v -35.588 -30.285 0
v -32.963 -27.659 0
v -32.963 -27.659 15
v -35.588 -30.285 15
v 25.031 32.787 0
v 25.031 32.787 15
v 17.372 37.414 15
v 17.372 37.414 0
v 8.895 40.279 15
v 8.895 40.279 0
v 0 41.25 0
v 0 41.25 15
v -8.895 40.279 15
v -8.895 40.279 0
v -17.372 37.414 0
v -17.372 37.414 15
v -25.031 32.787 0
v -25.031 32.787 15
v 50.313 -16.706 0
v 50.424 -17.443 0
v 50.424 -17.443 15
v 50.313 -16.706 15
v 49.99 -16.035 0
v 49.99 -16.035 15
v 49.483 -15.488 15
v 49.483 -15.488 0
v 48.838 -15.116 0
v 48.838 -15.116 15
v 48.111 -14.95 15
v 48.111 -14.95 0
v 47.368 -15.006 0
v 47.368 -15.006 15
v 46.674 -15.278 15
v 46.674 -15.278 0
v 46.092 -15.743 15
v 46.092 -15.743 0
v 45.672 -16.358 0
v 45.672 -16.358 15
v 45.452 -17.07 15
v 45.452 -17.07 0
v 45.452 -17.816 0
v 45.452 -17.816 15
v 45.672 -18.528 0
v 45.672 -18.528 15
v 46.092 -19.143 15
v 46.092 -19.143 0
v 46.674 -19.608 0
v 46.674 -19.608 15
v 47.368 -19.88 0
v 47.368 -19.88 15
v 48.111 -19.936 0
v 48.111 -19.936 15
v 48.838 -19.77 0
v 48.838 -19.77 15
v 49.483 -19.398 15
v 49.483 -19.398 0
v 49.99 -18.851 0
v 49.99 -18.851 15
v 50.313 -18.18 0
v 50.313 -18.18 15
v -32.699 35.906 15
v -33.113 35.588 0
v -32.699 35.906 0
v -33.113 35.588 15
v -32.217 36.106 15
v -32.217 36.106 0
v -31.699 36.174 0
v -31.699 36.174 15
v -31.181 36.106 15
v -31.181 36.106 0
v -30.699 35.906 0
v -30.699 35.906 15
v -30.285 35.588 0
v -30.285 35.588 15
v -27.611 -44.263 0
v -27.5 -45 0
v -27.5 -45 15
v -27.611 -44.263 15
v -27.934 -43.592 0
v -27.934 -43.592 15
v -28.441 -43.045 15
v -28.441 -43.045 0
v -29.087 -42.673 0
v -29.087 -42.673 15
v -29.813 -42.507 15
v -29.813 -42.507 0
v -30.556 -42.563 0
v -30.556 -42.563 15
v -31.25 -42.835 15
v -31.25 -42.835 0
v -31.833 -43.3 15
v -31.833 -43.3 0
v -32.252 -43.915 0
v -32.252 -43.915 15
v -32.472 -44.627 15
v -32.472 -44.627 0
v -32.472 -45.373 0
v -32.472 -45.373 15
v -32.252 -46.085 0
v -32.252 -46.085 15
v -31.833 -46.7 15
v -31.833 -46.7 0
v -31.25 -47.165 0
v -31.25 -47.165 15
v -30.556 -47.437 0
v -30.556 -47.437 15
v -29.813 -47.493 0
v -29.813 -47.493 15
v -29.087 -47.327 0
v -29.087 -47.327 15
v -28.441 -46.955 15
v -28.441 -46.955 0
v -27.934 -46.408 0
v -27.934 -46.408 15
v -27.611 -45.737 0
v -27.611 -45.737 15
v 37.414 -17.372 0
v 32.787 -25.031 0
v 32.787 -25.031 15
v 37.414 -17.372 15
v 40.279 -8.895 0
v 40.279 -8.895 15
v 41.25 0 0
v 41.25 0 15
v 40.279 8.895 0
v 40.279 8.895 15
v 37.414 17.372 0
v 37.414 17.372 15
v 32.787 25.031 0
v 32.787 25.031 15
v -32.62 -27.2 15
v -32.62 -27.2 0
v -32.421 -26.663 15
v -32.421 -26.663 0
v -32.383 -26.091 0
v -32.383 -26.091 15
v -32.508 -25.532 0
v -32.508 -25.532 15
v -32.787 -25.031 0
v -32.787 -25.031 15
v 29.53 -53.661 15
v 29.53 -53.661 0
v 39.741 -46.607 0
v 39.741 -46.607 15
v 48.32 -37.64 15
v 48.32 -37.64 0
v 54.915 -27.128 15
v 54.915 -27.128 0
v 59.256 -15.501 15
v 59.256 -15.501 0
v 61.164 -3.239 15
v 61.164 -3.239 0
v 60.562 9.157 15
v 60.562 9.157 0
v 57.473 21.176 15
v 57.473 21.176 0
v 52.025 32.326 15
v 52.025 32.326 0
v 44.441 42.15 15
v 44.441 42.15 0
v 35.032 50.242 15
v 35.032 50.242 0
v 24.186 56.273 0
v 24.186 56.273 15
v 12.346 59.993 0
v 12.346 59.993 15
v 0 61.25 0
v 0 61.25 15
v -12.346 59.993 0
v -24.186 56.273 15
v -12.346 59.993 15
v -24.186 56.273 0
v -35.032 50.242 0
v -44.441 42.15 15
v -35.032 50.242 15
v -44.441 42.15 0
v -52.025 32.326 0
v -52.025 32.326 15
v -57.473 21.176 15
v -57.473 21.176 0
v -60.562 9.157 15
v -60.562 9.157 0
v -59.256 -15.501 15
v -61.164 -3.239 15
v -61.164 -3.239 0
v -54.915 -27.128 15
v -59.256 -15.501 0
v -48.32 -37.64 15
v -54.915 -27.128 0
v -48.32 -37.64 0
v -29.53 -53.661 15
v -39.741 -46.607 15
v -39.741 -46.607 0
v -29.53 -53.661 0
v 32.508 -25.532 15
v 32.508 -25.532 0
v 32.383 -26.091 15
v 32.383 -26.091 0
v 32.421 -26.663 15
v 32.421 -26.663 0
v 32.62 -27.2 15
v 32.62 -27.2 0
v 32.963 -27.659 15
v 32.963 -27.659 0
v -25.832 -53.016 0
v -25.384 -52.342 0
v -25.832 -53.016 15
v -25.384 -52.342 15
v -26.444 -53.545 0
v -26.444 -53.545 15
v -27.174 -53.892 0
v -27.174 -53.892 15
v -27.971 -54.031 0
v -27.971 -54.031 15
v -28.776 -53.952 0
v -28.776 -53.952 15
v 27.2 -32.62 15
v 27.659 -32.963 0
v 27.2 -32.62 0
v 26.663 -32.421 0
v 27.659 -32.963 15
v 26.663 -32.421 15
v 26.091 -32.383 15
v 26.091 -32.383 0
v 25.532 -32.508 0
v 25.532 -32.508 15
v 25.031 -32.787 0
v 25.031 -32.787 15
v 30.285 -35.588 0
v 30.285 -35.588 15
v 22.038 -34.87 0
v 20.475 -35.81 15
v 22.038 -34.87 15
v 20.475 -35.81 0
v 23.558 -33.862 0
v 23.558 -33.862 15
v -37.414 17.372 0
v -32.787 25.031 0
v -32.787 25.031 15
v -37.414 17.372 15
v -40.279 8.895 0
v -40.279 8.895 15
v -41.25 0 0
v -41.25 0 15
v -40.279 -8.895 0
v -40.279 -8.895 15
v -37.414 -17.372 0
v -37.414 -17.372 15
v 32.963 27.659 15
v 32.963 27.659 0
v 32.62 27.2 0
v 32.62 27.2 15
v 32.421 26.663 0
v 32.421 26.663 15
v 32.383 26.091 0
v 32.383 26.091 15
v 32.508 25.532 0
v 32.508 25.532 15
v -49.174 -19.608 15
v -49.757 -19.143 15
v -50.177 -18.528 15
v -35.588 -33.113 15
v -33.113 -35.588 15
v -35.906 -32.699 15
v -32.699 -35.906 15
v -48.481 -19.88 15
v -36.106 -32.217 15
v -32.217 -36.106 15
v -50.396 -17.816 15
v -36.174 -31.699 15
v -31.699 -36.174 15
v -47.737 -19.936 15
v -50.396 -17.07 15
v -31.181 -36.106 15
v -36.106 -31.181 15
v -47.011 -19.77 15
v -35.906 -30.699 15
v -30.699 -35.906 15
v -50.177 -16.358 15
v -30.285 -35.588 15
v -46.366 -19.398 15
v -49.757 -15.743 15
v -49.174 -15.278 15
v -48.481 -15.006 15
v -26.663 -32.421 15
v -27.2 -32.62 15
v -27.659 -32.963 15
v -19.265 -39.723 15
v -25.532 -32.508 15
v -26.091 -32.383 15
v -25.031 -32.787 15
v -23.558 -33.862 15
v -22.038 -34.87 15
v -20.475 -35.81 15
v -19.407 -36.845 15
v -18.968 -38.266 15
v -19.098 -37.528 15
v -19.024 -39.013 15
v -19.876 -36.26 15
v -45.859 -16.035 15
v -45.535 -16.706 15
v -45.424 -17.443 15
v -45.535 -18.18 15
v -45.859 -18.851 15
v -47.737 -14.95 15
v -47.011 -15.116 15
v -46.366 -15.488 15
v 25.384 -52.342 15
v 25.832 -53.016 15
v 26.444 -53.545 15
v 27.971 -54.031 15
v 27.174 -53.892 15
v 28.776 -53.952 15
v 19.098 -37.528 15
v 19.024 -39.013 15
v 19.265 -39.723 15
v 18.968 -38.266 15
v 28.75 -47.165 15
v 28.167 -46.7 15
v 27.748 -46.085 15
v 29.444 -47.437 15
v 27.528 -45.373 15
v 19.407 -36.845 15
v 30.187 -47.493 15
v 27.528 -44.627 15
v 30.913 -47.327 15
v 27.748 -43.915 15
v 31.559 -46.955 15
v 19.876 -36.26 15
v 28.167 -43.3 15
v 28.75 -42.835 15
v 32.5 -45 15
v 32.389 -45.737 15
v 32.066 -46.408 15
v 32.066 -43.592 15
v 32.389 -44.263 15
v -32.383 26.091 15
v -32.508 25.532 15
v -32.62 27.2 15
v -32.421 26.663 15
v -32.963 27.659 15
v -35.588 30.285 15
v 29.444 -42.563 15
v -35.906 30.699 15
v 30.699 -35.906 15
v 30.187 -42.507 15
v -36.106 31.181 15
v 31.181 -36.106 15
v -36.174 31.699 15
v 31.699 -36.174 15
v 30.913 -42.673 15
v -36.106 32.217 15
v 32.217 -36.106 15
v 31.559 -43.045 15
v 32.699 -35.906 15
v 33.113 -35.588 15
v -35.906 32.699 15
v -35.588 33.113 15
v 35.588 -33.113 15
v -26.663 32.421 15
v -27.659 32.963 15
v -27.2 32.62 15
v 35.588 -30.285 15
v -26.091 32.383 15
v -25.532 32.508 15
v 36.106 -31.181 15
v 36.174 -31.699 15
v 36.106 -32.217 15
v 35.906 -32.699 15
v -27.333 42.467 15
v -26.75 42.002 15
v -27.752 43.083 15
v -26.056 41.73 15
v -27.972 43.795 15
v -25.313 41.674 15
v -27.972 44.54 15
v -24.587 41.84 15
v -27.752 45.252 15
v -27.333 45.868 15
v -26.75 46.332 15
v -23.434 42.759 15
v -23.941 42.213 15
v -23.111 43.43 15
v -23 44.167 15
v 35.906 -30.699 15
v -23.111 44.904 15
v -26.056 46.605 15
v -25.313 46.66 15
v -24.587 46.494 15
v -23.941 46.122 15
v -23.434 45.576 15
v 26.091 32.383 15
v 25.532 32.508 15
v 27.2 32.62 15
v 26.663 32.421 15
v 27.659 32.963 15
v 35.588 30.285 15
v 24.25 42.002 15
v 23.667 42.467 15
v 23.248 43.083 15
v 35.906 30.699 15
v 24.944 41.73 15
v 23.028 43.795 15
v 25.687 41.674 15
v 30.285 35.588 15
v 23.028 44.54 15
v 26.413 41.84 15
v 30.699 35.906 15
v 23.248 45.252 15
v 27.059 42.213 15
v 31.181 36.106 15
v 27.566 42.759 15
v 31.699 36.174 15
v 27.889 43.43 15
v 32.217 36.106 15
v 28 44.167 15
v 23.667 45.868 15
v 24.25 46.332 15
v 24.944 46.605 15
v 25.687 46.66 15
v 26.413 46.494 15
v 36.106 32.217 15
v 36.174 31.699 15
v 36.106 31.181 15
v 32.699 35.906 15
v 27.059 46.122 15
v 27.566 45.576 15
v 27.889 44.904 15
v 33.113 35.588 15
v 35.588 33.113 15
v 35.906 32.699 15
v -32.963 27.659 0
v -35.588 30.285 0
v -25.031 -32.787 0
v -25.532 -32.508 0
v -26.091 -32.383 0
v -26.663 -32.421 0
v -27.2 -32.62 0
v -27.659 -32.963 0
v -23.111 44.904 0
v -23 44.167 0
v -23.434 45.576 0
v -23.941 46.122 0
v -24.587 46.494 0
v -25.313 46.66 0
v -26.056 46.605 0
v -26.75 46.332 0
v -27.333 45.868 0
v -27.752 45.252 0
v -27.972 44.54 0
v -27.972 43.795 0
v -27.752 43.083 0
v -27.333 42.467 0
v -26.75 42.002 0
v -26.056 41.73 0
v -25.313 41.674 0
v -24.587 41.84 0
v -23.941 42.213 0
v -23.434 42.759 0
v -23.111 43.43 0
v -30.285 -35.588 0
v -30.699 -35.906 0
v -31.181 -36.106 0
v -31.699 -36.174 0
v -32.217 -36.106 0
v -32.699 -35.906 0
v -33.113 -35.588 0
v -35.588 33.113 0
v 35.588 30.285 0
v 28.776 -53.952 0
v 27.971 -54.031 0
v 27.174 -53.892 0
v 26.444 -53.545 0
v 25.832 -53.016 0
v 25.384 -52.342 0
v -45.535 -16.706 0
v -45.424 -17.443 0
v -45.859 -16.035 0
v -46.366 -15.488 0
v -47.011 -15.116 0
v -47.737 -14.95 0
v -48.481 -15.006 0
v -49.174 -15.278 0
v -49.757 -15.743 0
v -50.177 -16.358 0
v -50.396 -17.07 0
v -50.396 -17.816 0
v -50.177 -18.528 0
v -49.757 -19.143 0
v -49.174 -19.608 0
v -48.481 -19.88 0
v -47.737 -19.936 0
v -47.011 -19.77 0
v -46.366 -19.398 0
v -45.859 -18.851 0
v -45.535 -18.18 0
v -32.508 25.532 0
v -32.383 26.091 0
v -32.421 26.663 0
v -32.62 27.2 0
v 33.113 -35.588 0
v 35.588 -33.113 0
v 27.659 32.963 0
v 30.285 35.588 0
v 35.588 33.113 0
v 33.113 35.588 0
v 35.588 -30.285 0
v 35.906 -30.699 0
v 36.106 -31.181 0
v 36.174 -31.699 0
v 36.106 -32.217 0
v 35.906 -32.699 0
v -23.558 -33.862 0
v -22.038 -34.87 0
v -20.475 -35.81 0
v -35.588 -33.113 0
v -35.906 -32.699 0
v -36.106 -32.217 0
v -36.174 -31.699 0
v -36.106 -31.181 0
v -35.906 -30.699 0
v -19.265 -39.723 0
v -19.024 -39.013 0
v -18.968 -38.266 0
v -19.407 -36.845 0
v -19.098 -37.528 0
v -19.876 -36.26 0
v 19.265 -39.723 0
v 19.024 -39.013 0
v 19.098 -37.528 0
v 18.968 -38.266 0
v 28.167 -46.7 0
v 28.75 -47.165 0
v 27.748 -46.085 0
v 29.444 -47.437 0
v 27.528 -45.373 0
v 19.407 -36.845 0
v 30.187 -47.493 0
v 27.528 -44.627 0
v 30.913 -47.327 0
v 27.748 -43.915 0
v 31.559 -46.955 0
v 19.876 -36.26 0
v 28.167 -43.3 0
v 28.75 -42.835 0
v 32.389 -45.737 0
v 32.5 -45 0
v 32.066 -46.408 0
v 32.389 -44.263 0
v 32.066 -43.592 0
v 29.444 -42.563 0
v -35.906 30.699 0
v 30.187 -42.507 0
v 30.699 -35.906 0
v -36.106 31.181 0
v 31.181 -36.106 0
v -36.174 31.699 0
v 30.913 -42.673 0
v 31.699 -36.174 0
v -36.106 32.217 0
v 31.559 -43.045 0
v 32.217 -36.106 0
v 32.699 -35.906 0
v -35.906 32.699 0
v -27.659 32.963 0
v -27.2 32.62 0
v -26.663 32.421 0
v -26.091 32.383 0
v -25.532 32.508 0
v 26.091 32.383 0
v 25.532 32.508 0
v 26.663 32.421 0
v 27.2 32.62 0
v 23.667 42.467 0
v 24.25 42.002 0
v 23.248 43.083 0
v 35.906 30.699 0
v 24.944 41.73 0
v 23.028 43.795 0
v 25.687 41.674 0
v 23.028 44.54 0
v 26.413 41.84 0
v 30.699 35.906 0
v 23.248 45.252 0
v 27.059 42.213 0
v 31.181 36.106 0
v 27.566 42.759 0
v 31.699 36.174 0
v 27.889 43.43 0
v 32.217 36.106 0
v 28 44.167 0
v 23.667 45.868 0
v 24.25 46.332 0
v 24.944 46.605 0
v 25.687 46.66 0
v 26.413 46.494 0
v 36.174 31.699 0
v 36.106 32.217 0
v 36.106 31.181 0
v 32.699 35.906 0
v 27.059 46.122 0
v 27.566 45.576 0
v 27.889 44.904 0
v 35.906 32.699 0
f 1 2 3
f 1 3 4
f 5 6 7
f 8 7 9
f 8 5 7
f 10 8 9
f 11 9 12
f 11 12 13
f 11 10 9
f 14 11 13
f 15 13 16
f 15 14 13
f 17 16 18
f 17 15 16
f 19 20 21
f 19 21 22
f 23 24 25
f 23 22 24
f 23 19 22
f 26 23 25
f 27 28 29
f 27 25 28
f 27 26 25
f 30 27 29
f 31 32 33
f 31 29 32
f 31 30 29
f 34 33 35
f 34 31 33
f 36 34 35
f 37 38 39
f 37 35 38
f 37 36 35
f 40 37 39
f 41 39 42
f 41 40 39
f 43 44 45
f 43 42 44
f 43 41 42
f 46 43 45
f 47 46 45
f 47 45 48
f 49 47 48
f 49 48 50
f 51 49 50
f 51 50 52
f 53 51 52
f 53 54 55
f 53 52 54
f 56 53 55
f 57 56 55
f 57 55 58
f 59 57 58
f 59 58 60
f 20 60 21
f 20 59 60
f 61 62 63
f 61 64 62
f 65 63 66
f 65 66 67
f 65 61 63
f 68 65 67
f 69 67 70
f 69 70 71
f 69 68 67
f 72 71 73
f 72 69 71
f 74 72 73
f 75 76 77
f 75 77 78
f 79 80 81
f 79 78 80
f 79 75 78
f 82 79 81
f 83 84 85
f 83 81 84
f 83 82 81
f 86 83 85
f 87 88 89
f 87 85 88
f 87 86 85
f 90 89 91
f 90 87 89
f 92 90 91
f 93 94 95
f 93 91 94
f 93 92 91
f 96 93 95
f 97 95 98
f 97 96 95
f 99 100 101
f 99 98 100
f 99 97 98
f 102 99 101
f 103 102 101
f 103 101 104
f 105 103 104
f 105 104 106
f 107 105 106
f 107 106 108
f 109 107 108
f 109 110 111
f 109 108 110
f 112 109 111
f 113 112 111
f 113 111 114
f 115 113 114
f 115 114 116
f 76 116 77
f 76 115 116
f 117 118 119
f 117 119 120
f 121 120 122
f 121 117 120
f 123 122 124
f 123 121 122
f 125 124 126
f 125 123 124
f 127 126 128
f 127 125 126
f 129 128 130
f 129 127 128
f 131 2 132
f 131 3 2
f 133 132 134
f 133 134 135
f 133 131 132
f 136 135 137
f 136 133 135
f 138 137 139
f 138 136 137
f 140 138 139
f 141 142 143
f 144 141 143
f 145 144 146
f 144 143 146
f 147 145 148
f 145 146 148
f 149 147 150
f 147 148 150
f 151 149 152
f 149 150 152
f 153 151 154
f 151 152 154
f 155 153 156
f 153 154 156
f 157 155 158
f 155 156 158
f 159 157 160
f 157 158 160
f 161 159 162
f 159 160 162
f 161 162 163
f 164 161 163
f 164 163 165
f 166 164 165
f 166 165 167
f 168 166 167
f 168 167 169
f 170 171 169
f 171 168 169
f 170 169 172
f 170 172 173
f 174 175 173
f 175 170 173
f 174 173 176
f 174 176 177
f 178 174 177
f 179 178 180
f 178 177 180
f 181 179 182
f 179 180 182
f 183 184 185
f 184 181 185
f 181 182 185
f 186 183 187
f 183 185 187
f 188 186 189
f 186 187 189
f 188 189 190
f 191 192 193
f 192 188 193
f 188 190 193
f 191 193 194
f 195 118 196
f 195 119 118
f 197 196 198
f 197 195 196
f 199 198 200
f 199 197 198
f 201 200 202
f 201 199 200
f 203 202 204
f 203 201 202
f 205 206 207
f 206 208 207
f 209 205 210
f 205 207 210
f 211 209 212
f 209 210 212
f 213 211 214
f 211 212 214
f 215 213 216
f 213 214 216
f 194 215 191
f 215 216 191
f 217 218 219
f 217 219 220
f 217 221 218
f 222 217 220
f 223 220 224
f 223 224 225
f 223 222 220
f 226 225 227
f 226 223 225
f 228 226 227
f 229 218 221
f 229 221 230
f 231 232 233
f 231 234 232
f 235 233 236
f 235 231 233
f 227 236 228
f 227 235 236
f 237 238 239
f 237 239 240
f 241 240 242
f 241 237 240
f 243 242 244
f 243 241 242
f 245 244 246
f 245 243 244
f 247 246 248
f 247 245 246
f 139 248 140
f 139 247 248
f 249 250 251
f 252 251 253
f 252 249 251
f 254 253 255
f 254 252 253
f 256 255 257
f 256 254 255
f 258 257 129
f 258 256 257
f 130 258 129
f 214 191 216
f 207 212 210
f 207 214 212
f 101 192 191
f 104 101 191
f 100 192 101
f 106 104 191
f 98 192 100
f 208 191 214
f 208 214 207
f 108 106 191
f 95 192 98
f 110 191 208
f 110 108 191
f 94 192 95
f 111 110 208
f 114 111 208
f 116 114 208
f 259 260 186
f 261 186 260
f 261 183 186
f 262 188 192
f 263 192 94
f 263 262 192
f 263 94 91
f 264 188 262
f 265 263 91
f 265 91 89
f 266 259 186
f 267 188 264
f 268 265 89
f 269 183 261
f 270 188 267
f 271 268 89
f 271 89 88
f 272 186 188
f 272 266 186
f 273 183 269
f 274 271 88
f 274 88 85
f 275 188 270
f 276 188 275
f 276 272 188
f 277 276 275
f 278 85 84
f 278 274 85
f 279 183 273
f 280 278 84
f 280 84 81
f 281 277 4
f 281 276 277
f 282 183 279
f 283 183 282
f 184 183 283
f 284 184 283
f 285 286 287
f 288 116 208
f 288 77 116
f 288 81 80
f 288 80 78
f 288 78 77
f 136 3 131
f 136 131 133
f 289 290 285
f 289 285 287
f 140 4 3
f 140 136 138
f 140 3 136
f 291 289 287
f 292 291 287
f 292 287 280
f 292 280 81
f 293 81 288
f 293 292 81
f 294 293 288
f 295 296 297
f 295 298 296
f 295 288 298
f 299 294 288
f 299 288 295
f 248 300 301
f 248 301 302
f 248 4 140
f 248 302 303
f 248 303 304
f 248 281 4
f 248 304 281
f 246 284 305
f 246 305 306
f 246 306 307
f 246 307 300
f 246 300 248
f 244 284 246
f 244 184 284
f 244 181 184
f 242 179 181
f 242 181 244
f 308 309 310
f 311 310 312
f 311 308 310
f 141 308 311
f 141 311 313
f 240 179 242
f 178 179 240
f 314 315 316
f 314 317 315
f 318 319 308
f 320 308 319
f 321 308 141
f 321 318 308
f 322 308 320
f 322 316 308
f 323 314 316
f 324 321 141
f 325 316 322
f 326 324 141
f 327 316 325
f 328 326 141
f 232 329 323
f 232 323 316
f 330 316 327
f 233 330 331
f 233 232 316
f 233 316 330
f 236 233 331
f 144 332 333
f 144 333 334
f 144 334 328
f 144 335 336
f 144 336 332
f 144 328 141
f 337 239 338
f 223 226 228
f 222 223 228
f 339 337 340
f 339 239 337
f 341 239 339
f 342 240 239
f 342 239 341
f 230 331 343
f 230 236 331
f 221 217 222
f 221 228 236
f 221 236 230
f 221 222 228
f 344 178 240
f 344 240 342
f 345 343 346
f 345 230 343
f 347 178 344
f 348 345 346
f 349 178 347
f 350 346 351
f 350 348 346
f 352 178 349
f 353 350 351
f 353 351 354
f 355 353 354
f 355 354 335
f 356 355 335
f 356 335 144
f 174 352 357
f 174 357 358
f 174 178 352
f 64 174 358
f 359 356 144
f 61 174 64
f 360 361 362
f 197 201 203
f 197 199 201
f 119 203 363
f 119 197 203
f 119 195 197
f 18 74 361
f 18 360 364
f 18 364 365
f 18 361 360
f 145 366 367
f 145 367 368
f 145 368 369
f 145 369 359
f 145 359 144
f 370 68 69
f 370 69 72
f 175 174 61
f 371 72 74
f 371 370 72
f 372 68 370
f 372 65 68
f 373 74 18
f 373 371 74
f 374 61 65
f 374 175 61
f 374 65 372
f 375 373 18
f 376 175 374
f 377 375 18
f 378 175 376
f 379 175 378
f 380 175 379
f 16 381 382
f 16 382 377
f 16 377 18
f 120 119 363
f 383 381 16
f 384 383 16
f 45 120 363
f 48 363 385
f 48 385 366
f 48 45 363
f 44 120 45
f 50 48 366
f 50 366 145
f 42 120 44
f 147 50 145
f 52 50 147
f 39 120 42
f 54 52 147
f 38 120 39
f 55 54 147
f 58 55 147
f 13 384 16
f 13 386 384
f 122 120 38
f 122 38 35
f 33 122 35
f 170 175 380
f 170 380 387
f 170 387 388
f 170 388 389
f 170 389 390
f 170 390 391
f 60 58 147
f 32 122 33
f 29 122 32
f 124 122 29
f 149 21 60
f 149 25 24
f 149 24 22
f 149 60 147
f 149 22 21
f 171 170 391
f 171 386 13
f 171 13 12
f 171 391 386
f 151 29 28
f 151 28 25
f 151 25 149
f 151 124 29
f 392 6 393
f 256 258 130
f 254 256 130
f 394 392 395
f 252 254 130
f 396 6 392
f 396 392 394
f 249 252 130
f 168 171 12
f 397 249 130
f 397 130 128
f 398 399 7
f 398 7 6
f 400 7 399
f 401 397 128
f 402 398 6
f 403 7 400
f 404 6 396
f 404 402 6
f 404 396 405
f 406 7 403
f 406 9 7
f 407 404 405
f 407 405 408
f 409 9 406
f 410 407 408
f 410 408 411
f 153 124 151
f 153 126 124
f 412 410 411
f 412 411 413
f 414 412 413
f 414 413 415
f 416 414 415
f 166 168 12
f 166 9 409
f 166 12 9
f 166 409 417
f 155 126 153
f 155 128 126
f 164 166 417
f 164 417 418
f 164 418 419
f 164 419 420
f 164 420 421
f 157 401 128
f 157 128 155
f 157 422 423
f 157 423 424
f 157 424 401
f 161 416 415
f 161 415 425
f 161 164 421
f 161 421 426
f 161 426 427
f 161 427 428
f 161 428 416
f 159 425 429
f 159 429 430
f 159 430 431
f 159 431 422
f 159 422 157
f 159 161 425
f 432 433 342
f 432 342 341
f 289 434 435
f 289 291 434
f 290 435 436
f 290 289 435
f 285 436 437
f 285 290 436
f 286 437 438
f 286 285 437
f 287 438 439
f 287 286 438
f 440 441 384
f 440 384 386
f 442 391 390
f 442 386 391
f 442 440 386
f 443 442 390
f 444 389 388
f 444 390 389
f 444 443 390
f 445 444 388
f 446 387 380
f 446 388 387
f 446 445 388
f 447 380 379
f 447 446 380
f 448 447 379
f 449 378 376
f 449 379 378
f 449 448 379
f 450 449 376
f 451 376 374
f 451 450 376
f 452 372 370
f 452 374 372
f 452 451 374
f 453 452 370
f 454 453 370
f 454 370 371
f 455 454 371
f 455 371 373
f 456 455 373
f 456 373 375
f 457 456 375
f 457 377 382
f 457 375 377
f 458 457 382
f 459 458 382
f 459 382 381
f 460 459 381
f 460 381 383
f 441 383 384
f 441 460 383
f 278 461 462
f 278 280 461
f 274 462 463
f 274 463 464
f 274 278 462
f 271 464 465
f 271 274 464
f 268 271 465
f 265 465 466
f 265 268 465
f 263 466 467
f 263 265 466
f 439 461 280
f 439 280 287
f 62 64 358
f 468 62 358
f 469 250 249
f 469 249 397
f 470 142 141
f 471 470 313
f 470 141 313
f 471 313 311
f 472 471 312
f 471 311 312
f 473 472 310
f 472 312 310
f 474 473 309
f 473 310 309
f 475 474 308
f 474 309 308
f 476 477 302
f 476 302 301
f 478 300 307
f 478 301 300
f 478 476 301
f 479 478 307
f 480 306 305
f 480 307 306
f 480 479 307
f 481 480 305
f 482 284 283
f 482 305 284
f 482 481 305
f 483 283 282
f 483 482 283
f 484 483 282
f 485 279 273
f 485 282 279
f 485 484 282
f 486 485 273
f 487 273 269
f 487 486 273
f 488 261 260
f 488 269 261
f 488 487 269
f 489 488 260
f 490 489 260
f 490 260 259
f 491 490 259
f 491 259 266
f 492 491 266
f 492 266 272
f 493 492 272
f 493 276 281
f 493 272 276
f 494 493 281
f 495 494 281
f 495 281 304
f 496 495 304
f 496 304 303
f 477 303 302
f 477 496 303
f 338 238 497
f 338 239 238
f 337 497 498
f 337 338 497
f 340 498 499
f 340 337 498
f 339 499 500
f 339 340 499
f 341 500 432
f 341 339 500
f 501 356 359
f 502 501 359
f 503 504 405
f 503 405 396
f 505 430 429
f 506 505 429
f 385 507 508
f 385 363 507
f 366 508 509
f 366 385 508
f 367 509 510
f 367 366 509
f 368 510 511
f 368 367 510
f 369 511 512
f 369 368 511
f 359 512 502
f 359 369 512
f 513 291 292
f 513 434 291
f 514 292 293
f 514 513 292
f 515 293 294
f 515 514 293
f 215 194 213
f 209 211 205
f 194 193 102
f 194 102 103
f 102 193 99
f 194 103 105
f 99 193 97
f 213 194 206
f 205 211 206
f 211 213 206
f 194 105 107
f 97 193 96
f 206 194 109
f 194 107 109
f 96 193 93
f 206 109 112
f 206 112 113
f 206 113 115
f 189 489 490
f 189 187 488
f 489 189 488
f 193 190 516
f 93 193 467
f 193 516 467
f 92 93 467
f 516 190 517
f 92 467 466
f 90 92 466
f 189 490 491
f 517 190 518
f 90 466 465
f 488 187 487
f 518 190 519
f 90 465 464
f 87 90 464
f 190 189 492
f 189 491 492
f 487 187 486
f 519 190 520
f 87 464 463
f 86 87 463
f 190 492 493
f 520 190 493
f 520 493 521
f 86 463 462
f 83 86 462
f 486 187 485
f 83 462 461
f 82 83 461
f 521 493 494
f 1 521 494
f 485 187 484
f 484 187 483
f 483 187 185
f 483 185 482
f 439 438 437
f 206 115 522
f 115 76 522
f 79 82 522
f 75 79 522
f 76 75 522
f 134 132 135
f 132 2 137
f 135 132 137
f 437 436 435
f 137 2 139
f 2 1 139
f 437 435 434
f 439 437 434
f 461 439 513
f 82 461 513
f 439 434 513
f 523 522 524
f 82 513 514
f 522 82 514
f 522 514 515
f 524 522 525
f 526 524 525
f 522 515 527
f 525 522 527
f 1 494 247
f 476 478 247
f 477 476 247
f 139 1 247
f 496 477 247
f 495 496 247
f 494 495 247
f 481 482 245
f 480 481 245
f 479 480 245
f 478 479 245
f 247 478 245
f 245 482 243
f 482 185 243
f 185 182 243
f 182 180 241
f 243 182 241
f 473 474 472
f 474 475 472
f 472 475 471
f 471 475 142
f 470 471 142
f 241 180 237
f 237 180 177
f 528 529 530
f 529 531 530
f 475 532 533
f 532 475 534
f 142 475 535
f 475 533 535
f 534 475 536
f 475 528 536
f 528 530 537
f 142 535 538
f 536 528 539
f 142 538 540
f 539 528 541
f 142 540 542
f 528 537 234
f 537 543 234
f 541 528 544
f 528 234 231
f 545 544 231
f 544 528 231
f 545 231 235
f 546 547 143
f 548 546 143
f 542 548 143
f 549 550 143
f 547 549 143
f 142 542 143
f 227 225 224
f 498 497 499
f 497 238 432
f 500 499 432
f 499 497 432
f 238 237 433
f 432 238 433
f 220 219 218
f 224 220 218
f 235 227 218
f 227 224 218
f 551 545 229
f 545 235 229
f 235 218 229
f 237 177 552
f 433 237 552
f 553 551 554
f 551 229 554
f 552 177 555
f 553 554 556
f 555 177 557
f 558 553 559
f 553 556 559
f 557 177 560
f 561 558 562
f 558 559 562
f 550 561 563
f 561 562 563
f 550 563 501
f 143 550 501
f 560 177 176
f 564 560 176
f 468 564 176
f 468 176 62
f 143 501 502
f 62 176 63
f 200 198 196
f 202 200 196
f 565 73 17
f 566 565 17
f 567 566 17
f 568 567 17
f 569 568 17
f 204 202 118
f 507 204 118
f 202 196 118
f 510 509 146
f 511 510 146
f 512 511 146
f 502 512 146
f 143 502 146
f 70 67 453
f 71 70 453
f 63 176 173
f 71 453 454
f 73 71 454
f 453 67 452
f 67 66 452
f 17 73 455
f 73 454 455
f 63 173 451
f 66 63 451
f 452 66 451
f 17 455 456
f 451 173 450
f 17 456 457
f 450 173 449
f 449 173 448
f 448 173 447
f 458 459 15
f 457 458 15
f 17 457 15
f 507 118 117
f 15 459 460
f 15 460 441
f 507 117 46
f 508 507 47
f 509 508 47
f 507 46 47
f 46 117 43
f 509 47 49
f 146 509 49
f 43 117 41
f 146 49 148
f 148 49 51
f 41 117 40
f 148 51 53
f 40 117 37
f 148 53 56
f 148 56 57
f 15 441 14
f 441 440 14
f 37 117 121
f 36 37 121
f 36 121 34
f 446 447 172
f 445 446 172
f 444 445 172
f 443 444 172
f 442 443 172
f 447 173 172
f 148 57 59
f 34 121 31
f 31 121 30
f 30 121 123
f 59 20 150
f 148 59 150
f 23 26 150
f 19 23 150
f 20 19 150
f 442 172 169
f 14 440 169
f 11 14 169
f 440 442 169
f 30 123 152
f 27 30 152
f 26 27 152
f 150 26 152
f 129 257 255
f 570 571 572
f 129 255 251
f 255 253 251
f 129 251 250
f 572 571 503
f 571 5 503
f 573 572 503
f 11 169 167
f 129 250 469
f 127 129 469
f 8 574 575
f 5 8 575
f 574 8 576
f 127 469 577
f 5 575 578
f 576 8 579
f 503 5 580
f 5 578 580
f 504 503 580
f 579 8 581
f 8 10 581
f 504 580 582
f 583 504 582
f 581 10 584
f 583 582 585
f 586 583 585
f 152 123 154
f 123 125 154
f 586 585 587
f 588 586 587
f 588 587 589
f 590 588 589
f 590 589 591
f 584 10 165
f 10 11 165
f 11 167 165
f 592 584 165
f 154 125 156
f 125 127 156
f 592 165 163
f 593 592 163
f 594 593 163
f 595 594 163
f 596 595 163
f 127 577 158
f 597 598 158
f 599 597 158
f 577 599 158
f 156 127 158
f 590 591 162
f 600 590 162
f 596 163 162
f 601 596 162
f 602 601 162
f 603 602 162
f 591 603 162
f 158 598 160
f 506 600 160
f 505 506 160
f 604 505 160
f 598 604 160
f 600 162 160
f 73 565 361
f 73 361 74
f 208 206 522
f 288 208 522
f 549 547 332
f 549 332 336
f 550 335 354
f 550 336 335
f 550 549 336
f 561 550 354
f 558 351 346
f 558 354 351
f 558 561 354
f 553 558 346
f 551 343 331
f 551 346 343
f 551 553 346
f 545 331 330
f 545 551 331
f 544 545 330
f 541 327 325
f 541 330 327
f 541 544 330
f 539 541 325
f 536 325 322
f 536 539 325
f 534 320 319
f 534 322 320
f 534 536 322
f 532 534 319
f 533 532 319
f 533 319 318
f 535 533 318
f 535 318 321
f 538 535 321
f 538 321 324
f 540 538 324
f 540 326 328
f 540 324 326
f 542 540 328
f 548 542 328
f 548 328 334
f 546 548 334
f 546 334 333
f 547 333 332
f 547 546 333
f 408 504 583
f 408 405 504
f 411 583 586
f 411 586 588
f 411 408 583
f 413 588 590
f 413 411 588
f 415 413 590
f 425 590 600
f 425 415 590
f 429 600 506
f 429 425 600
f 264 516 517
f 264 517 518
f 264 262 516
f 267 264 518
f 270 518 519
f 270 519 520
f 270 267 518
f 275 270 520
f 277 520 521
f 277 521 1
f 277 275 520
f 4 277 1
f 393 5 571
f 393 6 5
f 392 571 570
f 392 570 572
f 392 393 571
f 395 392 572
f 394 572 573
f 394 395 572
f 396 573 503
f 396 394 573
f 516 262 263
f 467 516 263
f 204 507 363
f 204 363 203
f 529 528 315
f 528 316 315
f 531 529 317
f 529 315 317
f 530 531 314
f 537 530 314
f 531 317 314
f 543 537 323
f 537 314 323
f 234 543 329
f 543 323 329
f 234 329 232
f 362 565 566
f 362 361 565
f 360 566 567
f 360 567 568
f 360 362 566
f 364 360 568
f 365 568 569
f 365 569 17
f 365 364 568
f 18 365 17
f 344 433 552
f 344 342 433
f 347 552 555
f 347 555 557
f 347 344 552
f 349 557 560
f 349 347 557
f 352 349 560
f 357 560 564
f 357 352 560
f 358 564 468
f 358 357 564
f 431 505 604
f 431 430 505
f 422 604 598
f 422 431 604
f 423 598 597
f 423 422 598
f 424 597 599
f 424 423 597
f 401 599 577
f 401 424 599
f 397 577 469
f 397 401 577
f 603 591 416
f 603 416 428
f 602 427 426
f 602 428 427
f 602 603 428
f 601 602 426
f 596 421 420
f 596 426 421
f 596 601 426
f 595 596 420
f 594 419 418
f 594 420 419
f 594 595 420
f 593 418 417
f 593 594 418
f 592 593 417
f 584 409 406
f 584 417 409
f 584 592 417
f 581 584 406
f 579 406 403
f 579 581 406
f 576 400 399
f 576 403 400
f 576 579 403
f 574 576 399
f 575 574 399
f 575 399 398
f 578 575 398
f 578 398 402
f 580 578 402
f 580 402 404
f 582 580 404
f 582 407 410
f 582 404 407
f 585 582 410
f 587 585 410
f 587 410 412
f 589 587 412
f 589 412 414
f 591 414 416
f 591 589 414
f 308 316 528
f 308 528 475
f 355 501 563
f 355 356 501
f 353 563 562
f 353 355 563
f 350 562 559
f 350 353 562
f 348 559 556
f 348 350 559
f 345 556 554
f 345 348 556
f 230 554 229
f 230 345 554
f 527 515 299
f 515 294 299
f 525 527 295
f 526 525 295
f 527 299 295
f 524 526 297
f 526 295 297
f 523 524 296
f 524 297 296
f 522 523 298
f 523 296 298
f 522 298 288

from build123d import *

# Parameters (mm, degrees)
ESQUISSE1_R                  = 61.25
ESQUISSE1_R_2                = 41.25
BOSS_EXTRU_1_DEPTH           = 15
ENL_V_MAT_EXTRU_1_DEPTH      = 88.909754863
ENL_V_MAT_EXTRU_1_DEPTH_BACK = 88.909754863
ENL_V_MAT_EXTRU_2_DEPTH      = 88.909754863
ENL_V_MAT_EXTRU_2_DEPTH_BACK = 88.909754863
CONG_1_R                     = 2
CONG_2_R                     = 3
ENL_V_MAT_EXTRU_3_DEPTH      = 88.909754863
ENL_V_MAT_EXTRU_3_DEPTH_BACK = 88.909754863
ESQUISSE4_R                  = 2.5


with BuildPart() as part:
    # Esquisse1 → Boss.-Extru.1 (new body)
    with BuildSketch(Plane.XY):
        Circle(ESQUISSE1_R)
        Circle(ESQUISSE1_R_2, mode=Mode.SUBTRACT)
    extrude(amount=BOSS_EXTRU_1_DEPTH)

    # Esquisse2 → Enlèv. mat.-Extru.1 (cut, two sides: drawn at the far end of the back side and taken through both)
    with BuildSketch(Plane.XY.offset(15).offset(-ENL_V_MAT_EXTRU_1_DEPTH_BACK)):
        Polygon((26.395724667, 31.699025526), (31.699025526, 26.395724667), (37.002326385, 31.699025526), (31.699025526, 37.002326385), align=None)
        Polygon((31.699025526, -26.395724667), (26.395724667, -31.699025526), (31.699025526, -37.002326385), (37.002326385, -31.699025526), align=None)
        Polygon((-26.395724667, -31.699025526), (-31.699025526, -26.395724667), (-37.002326385, -31.699025526), (-31.699025526, -37.002326385), align=None)
        Polygon((-31.699025526, 26.395724667), (-26.395724667, 31.699025526), (-31.699025526, 37.002326385), (-37.002326385, 31.699025526), align=None)
    extrude(amount=ENL_V_MAT_EXTRU_1_DEPTH + ENL_V_MAT_EXTRU_1_DEPTH_BACK, mode=Mode.SUBTRACT)

    # Esquisse3 → Enlèv. mat.-Extru.2 (cut, two sides: drawn at the far end of the back side and taken through both)
    with BuildSketch(Plane.XY.offset(15).offset(-ENL_V_MAT_EXTRU_2_DEPTH_BACK)):
        with BuildLine():
            Line((-26.727272727, -55.110937141), (-18, -37.115529095))
            ThreePointArc((-18, -37.115529095), (0, -41.25), (18, -37.115529095))
            Line((18, -37.115529095), (26.727272727, -55.110937141))
            ThreePointArc((26.727272727, -55.110937141), (0, -61.25), (-26.727272727, -55.110937141))
        make_face()
    extrude(amount=ENL_V_MAT_EXTRU_2_DEPTH + ENL_V_MAT_EXTRU_2_DEPTH_BACK, mode=Mode.SUBTRACT)

    # Congé1
    cong_1_edges = [part.edges().sort_by_distance(p)[0] for p in [
        (-31.699025526, 37.002326385, 7.5),
        (-26.395724667, 31.699025526, 7.5),
        (-31.699025526, 26.395724667, 7.5),
        (-37.002326385, 31.699025526, 7.5),
        (-37.002326385, -31.699025526, 7.5),
        (-31.699025526, -26.395724667, 7.5),
        (-26.395724667, -31.699025526, 7.5),
        (-31.699025526, -37.002326385, 7.5),
        (31.699025526, -37.002326385, 7.5),
        (26.395724667, -31.699025526, 7.5),
        (31.699025526, -26.395724667, 7.5),
        (37.002326385, -31.699025526, 7.5),
        (37.002326385, 31.699025526, 7.5),
        (31.699025526, 26.395724667, 7.5),
        (26.395724667, 31.699025526, 7.5),
        (31.699025526, 37.002326385, 7.5),
    ]]
    fillet(cong_1_edges, radius=CONG_1_R)

    # Congé2
    cong_2_edges = [part.edges().sort_by_distance(p)[0] for p in [
        (-18, -37.115529095, 7.5),
        (18, -37.115529095, 7.5),
        (26.727272727, -55.110937141, 7.5),
        (-26.727272727, -55.110937141, 7.5),
    ]]
    fillet(cong_2_edges, radius=CONG_2_R)

    # Esquisse4 → Enlèv. mat.-Extru.3 (cut, two sides: drawn at the far end of the back side and taken through both)
    with BuildSketch(Plane.XY.offset(15).offset(-ENL_V_MAT_EXTRU_3_DEPTH_BACK)):
        with Locations((-30, -45)):
            Circle(ESQUISSE4_R)
        with Locations((30, -45)):
            Circle(ESQUISSE4_R)
        with Locations((-47.92432366, -17.44302731)):
            Circle(ESQUISSE4_R)
        with Locations((-25.5, 44.167295593)):
            Circle(ESQUISSE4_R)
        with Locations((25.5, 44.167295593)):
            Circle(ESQUISSE4_R)
        with Locations((47.92432366, -17.44302731)):
            Circle(ESQUISSE4_R)
    extrude(amount=ENL_V_MAT_EXTRU_3_DEPTH + ENL_V_MAT_EXTRU_3_DEPTH_BACK, mode=Mode.SUBTRACT)


solid = part.part
